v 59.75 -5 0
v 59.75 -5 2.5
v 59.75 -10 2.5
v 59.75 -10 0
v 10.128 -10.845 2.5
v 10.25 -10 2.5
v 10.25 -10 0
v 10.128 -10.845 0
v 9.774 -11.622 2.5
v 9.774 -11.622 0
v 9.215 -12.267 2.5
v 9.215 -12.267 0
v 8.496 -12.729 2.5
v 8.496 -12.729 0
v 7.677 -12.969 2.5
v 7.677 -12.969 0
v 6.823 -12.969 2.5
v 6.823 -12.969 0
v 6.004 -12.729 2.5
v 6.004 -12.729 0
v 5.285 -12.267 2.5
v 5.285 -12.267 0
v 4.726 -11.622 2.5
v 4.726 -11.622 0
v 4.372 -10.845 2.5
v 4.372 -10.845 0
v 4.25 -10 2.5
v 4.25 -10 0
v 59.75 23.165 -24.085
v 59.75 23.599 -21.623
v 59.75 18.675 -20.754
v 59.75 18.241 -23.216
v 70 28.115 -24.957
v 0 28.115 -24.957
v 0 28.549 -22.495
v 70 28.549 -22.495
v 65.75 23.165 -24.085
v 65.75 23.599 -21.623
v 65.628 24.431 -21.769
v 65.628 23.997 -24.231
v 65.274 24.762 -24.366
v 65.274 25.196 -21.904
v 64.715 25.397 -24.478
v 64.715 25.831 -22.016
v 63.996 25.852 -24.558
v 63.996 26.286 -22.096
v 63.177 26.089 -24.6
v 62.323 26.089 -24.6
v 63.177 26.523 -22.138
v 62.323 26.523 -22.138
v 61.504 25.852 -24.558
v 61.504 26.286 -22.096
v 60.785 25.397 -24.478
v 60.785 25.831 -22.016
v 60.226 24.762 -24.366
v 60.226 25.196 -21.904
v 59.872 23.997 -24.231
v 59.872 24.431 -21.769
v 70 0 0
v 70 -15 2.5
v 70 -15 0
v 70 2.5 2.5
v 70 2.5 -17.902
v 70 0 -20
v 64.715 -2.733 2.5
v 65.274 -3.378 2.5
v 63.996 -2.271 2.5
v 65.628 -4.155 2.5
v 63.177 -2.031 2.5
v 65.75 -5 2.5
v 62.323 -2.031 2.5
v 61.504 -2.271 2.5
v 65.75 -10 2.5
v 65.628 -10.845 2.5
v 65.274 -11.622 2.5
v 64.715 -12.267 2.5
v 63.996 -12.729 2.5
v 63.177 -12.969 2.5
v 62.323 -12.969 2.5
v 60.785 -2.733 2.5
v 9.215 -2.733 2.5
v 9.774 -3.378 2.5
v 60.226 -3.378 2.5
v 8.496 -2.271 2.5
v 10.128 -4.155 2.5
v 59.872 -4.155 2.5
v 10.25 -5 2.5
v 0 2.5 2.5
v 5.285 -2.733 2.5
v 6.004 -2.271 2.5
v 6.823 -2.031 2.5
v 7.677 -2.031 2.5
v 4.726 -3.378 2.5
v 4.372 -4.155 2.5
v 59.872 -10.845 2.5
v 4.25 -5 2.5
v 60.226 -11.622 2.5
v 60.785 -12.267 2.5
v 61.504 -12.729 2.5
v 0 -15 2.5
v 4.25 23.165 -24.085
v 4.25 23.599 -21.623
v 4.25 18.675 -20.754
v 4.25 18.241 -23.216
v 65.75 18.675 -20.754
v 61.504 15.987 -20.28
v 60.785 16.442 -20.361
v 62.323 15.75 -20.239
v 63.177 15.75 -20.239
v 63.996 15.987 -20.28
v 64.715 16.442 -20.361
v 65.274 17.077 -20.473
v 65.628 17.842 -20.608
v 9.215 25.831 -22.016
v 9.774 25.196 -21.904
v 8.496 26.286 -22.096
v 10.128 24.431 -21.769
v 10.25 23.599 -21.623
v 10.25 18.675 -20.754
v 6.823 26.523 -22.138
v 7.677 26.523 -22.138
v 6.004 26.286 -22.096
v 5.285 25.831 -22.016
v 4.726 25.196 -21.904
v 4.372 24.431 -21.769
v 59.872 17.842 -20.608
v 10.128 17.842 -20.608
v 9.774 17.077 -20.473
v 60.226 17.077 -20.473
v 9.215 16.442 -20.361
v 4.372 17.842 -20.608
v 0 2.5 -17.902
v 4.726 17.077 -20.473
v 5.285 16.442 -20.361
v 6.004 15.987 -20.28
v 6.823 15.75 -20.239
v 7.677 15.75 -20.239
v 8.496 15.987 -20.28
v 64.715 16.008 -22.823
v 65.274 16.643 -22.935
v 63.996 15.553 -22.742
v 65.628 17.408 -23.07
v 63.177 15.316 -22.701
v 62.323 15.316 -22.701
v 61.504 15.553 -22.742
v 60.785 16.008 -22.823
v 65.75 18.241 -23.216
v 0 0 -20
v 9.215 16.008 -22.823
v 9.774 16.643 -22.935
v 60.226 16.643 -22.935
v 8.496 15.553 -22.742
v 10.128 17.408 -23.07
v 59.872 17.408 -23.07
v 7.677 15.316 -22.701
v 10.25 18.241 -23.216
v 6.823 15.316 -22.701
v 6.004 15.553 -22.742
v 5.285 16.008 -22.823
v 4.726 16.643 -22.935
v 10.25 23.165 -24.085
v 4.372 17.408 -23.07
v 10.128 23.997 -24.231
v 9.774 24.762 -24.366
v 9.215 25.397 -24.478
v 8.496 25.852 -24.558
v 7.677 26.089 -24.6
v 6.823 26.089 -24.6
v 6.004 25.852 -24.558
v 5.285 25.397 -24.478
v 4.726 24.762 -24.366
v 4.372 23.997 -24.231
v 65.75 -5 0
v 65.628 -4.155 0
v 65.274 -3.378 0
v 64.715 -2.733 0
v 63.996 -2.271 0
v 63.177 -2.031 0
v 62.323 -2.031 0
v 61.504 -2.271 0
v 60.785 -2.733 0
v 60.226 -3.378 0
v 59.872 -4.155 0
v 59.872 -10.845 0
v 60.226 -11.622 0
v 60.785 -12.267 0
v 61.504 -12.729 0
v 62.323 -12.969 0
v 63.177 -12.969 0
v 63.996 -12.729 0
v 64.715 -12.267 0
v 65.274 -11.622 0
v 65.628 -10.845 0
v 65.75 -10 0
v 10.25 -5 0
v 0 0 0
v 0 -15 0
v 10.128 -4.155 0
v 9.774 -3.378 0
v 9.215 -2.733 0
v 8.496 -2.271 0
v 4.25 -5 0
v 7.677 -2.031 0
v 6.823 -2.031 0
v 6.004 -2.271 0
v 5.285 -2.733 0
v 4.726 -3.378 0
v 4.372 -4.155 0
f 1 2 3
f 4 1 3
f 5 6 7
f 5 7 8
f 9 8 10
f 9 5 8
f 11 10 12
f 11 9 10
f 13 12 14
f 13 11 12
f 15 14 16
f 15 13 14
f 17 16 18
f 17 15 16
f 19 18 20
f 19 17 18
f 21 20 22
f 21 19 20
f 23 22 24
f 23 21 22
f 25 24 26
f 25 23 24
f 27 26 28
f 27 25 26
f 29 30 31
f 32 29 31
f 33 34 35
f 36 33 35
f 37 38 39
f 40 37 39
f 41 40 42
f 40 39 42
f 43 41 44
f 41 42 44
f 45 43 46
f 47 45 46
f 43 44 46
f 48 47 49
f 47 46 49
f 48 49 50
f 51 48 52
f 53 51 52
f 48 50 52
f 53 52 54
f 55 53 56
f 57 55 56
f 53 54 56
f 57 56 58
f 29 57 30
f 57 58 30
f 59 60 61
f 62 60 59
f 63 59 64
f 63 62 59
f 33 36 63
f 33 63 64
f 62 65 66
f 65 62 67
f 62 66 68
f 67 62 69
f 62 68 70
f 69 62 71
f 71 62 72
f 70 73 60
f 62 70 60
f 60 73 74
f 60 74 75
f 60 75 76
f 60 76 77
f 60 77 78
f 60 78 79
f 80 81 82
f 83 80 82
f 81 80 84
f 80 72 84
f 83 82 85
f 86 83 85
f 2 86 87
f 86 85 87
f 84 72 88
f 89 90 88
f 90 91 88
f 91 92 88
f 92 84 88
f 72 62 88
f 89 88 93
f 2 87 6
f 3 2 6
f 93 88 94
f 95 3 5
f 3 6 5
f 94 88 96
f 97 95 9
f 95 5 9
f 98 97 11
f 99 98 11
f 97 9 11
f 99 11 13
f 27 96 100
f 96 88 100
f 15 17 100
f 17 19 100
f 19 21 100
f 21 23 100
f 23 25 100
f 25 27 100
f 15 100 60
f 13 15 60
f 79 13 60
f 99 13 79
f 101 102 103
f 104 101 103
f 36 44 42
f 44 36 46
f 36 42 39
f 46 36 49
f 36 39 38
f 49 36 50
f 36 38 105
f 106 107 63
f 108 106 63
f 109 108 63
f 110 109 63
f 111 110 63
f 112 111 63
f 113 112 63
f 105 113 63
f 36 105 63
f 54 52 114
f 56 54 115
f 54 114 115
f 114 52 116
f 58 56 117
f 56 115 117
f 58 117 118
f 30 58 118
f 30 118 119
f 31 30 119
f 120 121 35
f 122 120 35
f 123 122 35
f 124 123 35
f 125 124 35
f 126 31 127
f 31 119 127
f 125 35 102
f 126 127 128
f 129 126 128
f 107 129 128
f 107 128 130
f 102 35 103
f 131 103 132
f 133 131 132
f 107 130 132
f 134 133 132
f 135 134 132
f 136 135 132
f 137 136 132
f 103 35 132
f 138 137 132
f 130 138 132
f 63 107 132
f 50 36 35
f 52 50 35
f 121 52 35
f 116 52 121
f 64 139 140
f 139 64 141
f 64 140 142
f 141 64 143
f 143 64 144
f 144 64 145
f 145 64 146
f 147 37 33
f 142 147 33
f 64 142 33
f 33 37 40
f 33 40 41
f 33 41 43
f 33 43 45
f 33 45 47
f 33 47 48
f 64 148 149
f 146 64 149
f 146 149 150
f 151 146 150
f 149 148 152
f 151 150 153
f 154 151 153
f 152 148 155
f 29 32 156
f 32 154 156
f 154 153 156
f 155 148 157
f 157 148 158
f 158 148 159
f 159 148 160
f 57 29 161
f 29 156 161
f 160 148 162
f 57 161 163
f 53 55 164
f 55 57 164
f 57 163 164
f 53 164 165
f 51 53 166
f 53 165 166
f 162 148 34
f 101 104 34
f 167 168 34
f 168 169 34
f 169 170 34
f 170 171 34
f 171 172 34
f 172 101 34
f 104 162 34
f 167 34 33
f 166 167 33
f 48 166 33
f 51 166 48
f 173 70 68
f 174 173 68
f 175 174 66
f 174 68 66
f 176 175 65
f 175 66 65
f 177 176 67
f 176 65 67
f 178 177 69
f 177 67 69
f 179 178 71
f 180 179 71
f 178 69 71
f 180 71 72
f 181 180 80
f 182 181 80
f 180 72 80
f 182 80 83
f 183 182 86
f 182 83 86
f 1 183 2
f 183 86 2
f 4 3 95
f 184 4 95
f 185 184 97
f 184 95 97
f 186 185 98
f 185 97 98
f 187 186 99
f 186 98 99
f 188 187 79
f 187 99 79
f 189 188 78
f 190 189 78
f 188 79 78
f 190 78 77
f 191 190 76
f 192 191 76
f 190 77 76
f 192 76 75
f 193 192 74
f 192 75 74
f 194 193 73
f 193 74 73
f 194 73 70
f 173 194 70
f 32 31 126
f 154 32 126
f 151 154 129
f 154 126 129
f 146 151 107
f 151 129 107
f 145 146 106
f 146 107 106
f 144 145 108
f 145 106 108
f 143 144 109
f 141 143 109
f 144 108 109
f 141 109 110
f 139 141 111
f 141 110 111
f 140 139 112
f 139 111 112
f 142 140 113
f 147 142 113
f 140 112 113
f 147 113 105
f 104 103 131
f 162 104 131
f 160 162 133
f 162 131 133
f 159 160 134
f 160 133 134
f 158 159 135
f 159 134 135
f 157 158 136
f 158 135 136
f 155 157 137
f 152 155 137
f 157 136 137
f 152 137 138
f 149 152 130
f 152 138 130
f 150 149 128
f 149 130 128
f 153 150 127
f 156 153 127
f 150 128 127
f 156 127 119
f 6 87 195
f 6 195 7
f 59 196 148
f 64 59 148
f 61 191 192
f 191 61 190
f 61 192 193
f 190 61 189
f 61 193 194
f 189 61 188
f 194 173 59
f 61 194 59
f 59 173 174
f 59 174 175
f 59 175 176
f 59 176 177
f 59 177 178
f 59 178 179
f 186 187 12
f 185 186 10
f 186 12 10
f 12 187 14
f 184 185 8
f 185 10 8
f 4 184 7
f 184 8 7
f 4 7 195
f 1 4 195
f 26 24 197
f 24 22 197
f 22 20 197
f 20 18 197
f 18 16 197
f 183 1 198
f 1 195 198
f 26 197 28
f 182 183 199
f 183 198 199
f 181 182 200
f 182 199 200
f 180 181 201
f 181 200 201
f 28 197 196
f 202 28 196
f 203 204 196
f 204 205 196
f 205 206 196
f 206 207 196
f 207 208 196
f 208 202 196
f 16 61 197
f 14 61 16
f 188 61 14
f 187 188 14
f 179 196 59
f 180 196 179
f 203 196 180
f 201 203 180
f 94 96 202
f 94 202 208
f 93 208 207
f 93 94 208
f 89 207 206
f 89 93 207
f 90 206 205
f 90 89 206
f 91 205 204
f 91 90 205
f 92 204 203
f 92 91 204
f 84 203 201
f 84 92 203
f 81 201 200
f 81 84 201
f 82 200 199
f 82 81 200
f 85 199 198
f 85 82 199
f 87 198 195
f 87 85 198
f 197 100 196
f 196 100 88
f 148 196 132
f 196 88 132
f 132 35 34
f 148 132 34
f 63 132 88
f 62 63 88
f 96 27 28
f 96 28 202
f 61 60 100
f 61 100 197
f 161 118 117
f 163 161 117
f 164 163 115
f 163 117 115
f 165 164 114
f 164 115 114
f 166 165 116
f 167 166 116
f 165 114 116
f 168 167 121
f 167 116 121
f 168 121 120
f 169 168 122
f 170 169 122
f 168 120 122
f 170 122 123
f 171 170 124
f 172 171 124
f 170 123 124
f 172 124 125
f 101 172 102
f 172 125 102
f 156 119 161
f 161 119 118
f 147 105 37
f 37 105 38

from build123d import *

# Parameters (mm, degrees)
EXTRUDE_1_DEPTH     = 70
CUT_EXTRUDE_1_DEPTH = 70
CUT_EXTRUDE_2_DEPTH = 10


with BuildPart() as part:
    # 草图1 → 凸台-拉伸1 (new body)
    with BuildSketch(Plane(origin=(0, 0, 0), x_dir=(0, 0, -1), z_dir=(1, 0, 0))):
        Polygon((0, 0), (20, 0), (24.957460038, 28.115152986), (22.495440656, 28.54927343), (17.902250922, 2.5), (-2.5, 2.5), (-2.5, -15), (0, -15), align=None)
    extrude(amount=EXTRUDE_1_DEPTH)

    # 草图2 → 切除-拉伸1 (cut)
    with BuildSketch(Plane.XY.offset(2.5)):
        with BuildLine():
            Line((4.25, -10), (4.25, -5))
            ThreePointArc((4.25, -5), (7.25, -2), (10.25, -5))
            Line((10.25, -5), (10.25, -10))
            ThreePointArc((10.25, -10), (7.25, -13), (4.25, -10))
        make_face()
        with BuildLine():
            Line((65.75, -10), (65.75, -5))
            ThreePointArc((65.75, -5), (62.75, -2), (59.75, -5))
            Line((59.75, -5), (59.75, -10))
            ThreePointArc((59.75, -10), (62.75, -13), (65.75, -10))
        make_face()
    extrude(amount=-CUT_EXTRUDE_1_DEPTH, mode=Mode.SUBTRACT)

    # 草图3 → 切除-拉伸2 (cut)
    with BuildSketch(Plane(origin=(0, -2.986080989, -16.934906825), x_dir=(1, 0, 0), z_dir=(0, 0.17364817766693397, 0.9848077530122076))):
        with BuildLine():
            Line((4.25, 26.994852841), (4.25, 21.994852841))
            ThreePointArc((4.25, 21.994852841), (7.25, 18.994852841), (10.25, 21.994852841))
            Line((10.25, 21.994852841), (10.25, 26.994852841))
            ThreePointArc((10.25, 26.994852841), (7.25, 29.994852841), (4.25, 26.994852841))
        make_face()
        with BuildLine():
            Line((59.75, 26.994852841), (59.75, 21.994852841))
            ThreePointArc((59.75, 21.994852841), (62.75, 18.994852841), (65.75, 21.994852841))
            Line((65.75, 21.994852841), (65.75, 26.994852841))
            ThreePointArc((65.75, 26.994852841), (62.75, 29.994852841), (59.75, 26.994852841))
        make_face()
    extrude(amount=-CUT_EXTRUDE_2_DEPTH, mode=Mode.SUBTRACT)


solid = part.part
